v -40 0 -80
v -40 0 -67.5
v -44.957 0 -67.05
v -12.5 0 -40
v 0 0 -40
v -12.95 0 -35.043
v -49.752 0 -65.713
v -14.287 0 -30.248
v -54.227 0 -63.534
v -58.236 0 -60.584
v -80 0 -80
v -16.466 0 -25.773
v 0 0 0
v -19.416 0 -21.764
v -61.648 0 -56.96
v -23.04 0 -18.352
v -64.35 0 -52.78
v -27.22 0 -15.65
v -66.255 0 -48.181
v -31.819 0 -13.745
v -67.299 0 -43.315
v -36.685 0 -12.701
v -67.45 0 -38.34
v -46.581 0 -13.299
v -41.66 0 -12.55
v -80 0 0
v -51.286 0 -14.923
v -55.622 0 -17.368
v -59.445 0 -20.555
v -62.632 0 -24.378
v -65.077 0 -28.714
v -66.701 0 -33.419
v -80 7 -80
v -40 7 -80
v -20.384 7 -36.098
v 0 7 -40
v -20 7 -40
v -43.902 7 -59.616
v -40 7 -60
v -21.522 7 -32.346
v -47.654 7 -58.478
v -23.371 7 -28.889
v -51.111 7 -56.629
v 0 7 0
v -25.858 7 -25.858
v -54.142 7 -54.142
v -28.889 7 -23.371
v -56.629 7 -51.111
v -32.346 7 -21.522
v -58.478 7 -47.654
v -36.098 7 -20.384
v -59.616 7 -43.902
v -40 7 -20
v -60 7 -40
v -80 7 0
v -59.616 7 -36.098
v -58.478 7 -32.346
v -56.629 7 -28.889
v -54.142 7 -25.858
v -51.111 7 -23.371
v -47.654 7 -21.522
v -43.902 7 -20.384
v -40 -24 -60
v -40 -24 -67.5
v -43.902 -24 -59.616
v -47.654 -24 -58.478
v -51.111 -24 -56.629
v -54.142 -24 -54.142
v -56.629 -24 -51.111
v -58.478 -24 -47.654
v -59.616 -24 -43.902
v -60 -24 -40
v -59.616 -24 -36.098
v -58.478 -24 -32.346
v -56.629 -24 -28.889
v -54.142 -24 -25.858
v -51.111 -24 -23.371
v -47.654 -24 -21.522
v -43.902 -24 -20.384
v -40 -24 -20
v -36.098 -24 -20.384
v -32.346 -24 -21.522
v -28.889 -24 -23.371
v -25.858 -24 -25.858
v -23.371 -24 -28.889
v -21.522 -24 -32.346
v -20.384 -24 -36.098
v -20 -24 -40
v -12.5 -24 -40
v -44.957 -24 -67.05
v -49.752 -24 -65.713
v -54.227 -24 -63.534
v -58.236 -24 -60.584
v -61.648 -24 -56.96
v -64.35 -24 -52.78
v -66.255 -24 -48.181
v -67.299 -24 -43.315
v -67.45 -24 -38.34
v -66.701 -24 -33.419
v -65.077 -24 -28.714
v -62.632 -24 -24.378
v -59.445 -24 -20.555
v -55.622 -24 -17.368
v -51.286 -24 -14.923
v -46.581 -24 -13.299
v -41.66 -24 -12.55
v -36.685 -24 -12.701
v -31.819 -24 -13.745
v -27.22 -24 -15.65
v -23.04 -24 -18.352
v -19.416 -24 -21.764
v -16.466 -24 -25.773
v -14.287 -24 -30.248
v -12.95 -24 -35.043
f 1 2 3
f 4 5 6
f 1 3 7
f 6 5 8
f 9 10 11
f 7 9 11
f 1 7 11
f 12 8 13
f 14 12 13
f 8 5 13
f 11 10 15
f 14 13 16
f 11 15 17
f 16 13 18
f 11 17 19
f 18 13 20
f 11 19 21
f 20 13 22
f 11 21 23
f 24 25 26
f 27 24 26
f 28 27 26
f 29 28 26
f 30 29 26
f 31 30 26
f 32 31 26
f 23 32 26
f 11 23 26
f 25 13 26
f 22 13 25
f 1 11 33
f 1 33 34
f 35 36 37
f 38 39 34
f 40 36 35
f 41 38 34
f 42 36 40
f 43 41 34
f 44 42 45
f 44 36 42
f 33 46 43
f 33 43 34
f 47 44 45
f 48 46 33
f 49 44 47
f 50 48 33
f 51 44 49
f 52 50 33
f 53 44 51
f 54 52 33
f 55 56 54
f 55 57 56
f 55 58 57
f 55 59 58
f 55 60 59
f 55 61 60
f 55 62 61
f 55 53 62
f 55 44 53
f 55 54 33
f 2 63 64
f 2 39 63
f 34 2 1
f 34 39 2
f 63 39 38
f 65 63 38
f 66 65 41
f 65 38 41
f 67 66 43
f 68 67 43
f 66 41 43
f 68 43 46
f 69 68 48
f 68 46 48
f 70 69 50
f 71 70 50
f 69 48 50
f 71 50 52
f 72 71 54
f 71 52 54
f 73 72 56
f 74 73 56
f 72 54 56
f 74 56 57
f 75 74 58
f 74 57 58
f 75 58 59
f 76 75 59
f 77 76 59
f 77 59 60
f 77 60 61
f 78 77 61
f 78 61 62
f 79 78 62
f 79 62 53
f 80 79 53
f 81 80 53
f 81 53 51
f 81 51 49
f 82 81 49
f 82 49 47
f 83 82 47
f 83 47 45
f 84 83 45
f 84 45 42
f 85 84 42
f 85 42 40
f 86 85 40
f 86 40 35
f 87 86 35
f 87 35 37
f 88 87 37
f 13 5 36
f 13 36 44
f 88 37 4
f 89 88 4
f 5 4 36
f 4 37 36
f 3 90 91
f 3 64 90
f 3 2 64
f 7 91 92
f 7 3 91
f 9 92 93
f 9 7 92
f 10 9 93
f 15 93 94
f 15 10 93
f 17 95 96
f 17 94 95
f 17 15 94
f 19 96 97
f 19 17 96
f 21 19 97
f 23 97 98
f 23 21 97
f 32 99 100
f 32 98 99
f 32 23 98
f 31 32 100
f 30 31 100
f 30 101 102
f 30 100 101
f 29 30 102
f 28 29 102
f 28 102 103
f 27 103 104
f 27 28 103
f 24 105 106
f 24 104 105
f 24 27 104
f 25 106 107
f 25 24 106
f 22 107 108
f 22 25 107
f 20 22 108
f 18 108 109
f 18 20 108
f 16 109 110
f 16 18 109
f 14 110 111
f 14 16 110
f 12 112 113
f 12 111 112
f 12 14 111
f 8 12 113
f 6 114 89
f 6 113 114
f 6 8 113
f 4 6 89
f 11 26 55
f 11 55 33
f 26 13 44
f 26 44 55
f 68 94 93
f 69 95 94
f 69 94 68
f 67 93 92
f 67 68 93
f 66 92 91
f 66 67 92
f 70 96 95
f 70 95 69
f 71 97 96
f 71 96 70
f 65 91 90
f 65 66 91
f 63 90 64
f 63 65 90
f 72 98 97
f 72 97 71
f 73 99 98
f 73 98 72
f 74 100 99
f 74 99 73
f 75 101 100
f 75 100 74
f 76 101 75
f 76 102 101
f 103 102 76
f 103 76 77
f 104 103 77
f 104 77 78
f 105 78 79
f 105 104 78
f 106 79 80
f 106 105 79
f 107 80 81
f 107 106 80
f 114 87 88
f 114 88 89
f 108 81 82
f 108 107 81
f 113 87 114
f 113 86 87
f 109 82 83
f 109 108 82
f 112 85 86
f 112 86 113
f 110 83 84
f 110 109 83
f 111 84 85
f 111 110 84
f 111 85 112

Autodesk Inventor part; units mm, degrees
ref_plane "YZ Plane" through (0, 0, 0) normal (1, 0, 0) x (0, 1, 0)
ref_plane "XZ Plane" through (0, 0, 0) normal (0, 1, 0) x (-1, 0, 0)
ref_plane "XY Plane" through (0, 0, 0) normal (0, 0, 1) x (1, 0, 0)
sketch "Boceto1" plane through (0, 0, 0) normal (0, 1, 0) x (-1, 0, 0)
  line L0 (0, 0) -> (80, 0)
  line L1 (80, 0) -> (80, -80)
  line L2 (80, -80) -> (0, -80)
  line L3 (0, -80) -> (0, 0)
  dimension "d0" = 80
  dimension "d1" = 80
extrude "Extrusión1" add sketch "Boceto1" along normal blind 7
sketch "Boceto2" plane through (0, 0, 0) normal (0, -1, 0) x (1, 0, 0)
  point P0 (0, 0)
sketch "Boceto3" plane through (0, 0, 0) normal (0, -1, 0) x (1, 0, 0)
  line L0 (-80, 0) -> (0, 0) construction
  line L1 (-40, 0) -> (-40, -80) construction
  line L2 (0, -80) -> (-80, -80) construction
  line L3 (-80, -80) -> (-80, 0) construction
  line L4 (-80, -40) -> (0, -40) construction
  line L5 (0, 0) -> (0, -80) construction
  circle A0 centre (-40, -40) radius 27.5
  dimension "d4" = 55
extrude "Extrusión2" add sketch "Boceto3" along normal blind 24
hole "Agujero1" at (-40, 0, -40) direction (0, 1, 0) diameter 40 end through all both
sketch "Boceto4" plane through (0, 7, 0) normal (0, 1, 0) x (1, 0, 0)
  circle A0 centre (-40, 40) radius 20 projected
  line L0 (-40, 40) -> (-40, 80)
  line L1 (0, 80) -> (-80, 80) projected
  line L2 (0, 80) -> (0, 40)
  line L3 (0, 0) -> (0, 80) projected
  line L4 (-40, 40) -> (0, 40)
  point P0 (-20, 40)
  point P1 (-40, 60)
extrude "Extrusión3" cut sketch "Boceto4" against normal through all contours A0 L0 L1 L2 L4
sketch "Boceto7" plane through (0, 7, 0) normal (0, 1, 0) x (1, 0, 0)
  line L0 (-40, 40) -> (-57.5963, 22.4037) construction
  line L1 (-80, 40) -> (0, 40) construction
  line L2 (-58.6139, 17.8506) -> (-50.0833, 26.3811)
  line L3 (-50.0833, 26.3811) -> (-53.6189, 29.9167)
  line L4 (-53.6189, 29.9167) -> (-62.1494, 21.3861)
  line L5 (-62.1494, 21.3861) -> (-58.6139, 17.8506)
  point P0 (0, 0)
  point P1 (-60.3816, 19.6184)
  dimension "d16" = 135
  dimension "d17" = 2.5
  dimension "d18" = 2.5
  dimension "d19" = 12.064
sketch3d "Boceto 3D1"
properties part number "Parctica final.xx"
